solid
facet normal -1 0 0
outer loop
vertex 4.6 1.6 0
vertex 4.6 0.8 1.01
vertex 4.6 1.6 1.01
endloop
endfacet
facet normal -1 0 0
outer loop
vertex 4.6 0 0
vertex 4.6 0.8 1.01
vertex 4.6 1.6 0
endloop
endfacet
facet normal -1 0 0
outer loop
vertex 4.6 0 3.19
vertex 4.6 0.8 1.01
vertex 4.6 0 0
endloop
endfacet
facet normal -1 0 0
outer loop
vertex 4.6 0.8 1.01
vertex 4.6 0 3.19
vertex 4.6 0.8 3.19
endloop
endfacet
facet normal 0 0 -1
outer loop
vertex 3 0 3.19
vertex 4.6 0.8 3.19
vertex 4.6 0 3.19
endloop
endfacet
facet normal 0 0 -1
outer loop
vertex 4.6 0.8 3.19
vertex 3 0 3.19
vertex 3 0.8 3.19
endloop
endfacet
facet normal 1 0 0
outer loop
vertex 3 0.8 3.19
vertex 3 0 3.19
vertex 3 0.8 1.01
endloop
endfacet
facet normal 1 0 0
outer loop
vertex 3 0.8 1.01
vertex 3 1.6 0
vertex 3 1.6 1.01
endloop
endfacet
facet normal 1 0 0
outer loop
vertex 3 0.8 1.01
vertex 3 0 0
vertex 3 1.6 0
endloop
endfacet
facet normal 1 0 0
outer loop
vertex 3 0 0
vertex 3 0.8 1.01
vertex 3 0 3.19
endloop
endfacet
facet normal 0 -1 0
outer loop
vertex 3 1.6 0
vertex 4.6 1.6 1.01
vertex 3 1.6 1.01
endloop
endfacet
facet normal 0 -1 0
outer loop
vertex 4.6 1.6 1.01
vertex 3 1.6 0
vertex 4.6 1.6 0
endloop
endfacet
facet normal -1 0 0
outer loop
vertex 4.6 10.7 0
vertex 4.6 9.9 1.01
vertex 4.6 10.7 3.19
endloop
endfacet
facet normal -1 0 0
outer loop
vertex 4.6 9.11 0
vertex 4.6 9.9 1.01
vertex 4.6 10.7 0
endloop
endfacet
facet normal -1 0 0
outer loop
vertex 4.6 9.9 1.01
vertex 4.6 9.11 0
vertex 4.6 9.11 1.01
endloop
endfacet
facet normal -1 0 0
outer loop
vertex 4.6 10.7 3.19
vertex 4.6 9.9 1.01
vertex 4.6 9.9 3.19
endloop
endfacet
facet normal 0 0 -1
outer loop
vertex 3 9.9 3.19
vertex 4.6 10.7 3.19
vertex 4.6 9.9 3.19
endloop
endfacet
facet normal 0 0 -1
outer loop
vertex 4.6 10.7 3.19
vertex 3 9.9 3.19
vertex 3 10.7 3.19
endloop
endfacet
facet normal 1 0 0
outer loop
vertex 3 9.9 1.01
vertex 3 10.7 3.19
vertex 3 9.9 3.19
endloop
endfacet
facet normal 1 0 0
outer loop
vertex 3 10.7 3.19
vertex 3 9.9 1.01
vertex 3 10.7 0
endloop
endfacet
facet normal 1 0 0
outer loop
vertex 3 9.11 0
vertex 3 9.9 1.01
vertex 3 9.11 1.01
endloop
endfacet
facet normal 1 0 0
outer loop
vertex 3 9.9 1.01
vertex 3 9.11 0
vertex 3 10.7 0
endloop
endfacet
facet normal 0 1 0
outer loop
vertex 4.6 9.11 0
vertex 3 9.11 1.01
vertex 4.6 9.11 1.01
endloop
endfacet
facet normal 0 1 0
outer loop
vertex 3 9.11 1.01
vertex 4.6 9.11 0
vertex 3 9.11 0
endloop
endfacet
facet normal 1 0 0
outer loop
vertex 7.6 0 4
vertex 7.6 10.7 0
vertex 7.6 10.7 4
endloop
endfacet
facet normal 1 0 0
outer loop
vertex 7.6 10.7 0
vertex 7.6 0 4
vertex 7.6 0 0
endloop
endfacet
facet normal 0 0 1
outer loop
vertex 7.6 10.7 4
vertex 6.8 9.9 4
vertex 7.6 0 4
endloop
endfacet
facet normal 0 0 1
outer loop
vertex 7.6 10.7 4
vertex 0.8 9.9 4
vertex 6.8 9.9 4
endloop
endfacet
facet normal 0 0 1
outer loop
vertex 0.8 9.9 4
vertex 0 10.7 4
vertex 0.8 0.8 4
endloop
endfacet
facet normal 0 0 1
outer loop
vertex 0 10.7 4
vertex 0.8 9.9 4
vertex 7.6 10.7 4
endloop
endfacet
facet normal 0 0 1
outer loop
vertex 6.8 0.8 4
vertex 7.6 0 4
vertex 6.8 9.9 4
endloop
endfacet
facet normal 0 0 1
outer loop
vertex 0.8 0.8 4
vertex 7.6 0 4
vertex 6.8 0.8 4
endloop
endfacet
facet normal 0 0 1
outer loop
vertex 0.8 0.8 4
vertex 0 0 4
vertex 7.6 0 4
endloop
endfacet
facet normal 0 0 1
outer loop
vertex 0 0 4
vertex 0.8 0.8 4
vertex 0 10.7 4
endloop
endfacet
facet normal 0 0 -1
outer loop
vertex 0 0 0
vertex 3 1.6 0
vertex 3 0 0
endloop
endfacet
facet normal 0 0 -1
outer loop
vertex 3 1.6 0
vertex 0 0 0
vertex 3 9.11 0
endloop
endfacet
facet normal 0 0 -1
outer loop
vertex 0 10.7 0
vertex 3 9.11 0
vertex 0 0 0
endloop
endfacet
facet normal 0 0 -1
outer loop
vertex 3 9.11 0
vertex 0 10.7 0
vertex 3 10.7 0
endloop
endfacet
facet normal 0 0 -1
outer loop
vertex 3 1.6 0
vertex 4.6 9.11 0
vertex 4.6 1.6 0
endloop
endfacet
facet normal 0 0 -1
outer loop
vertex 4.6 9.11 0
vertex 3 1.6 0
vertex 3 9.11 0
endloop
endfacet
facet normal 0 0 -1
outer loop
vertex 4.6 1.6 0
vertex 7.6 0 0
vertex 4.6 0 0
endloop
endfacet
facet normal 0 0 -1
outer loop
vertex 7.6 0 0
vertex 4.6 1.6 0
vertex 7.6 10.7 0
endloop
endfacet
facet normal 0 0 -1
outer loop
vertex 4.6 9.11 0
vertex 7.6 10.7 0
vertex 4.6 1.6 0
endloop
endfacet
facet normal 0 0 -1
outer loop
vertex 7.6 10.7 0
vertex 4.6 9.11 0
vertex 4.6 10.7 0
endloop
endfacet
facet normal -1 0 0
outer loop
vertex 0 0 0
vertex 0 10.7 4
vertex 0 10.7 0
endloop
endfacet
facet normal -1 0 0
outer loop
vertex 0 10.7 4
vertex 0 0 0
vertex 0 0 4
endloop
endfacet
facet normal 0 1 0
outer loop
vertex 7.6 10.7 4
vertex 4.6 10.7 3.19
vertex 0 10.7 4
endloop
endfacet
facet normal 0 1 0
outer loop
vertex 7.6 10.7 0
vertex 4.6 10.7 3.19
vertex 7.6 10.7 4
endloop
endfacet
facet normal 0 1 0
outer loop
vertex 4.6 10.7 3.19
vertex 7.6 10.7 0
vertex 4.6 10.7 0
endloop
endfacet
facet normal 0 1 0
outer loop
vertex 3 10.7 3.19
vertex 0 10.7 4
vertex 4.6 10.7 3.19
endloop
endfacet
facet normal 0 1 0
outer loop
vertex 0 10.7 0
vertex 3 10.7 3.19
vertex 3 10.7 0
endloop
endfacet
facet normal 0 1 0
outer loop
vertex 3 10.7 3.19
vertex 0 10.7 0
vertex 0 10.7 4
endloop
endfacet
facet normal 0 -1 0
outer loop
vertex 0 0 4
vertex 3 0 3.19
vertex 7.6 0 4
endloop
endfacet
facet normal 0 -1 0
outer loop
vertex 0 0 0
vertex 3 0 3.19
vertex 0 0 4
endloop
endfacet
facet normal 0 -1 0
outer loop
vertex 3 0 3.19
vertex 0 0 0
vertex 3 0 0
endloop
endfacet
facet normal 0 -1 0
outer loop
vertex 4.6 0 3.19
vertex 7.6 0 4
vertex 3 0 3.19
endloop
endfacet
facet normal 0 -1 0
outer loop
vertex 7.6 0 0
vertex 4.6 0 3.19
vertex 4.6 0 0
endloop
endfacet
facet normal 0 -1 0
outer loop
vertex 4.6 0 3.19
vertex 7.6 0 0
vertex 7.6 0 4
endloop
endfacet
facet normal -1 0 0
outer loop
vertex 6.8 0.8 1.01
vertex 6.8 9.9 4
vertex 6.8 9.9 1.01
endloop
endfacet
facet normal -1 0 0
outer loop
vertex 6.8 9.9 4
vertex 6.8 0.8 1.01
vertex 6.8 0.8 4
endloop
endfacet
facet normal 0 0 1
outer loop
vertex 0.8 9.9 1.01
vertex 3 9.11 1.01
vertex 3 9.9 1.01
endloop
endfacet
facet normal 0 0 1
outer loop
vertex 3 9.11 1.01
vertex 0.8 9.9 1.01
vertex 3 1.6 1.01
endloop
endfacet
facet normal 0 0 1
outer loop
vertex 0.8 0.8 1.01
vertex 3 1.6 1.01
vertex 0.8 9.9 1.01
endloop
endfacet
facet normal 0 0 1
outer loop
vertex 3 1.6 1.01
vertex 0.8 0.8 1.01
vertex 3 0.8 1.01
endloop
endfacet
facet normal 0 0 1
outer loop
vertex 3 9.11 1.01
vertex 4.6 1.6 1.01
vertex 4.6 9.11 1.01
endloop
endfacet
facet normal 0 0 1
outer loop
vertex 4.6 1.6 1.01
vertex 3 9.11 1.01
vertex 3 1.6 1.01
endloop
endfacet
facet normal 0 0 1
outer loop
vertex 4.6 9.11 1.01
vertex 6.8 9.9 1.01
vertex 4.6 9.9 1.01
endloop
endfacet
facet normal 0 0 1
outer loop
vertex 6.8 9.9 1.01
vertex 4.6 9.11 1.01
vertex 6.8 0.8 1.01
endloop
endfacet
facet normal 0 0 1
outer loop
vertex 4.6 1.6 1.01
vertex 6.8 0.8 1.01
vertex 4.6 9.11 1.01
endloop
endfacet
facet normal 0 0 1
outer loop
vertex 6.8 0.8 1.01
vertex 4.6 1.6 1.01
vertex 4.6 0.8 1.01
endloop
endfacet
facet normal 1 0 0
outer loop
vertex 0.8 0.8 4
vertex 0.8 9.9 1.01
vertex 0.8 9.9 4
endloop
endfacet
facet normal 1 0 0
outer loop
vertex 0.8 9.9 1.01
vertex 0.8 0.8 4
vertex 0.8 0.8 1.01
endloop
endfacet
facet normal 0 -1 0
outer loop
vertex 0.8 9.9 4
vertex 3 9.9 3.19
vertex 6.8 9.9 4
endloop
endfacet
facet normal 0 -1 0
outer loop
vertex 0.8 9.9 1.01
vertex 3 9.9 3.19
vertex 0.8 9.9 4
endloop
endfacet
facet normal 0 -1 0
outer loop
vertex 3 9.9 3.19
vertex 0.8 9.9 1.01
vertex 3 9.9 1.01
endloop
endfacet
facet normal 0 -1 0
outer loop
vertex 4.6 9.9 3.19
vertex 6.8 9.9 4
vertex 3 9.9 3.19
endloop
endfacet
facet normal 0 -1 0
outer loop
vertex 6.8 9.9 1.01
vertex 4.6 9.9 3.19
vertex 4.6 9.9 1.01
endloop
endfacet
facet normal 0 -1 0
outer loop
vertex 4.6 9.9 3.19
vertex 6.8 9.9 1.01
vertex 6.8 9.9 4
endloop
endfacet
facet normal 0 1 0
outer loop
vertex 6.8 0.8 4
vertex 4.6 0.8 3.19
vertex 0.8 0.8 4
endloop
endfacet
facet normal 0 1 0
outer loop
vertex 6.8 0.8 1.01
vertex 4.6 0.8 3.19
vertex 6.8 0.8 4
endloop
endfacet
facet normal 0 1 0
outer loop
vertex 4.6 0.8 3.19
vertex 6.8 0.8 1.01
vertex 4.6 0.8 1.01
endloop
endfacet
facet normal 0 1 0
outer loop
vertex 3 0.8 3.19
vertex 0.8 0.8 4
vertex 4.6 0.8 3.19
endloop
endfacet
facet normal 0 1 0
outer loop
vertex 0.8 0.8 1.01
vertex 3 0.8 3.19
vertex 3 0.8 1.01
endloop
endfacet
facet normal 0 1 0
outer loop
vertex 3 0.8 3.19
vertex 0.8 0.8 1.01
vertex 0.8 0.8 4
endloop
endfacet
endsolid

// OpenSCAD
WALL_TH=0.8;
TOP_TH=1.0; // current
//TOP_TH=0.6; // old case
W=7.6;
L=10.7;
D=4; // new style

NOTCH_W=WALL_TH * 2;
NOTCH_L=WALL_TH * 2;
NOTCH_POS=[ [(W - NOTCH_W) / 2, -0.01, -0.01],
            [(W  - NOTCH_W) / 2, L - NOTCH_L + 0.01, -0.01]];
difference() {
    cube([W, L, D]);
    translate([WALL_TH, WALL_TH, TOP_TH + 0.01]) cube([W - (WALL_TH * 2), L - (WALL_TH * 2), D-TOP_TH]);
    for(pos=NOTCH_POS) {
        translate(pos) cube([NOTCH_W, NOTCH_L + 0.01, D - WALL_TH]);
    }
}
